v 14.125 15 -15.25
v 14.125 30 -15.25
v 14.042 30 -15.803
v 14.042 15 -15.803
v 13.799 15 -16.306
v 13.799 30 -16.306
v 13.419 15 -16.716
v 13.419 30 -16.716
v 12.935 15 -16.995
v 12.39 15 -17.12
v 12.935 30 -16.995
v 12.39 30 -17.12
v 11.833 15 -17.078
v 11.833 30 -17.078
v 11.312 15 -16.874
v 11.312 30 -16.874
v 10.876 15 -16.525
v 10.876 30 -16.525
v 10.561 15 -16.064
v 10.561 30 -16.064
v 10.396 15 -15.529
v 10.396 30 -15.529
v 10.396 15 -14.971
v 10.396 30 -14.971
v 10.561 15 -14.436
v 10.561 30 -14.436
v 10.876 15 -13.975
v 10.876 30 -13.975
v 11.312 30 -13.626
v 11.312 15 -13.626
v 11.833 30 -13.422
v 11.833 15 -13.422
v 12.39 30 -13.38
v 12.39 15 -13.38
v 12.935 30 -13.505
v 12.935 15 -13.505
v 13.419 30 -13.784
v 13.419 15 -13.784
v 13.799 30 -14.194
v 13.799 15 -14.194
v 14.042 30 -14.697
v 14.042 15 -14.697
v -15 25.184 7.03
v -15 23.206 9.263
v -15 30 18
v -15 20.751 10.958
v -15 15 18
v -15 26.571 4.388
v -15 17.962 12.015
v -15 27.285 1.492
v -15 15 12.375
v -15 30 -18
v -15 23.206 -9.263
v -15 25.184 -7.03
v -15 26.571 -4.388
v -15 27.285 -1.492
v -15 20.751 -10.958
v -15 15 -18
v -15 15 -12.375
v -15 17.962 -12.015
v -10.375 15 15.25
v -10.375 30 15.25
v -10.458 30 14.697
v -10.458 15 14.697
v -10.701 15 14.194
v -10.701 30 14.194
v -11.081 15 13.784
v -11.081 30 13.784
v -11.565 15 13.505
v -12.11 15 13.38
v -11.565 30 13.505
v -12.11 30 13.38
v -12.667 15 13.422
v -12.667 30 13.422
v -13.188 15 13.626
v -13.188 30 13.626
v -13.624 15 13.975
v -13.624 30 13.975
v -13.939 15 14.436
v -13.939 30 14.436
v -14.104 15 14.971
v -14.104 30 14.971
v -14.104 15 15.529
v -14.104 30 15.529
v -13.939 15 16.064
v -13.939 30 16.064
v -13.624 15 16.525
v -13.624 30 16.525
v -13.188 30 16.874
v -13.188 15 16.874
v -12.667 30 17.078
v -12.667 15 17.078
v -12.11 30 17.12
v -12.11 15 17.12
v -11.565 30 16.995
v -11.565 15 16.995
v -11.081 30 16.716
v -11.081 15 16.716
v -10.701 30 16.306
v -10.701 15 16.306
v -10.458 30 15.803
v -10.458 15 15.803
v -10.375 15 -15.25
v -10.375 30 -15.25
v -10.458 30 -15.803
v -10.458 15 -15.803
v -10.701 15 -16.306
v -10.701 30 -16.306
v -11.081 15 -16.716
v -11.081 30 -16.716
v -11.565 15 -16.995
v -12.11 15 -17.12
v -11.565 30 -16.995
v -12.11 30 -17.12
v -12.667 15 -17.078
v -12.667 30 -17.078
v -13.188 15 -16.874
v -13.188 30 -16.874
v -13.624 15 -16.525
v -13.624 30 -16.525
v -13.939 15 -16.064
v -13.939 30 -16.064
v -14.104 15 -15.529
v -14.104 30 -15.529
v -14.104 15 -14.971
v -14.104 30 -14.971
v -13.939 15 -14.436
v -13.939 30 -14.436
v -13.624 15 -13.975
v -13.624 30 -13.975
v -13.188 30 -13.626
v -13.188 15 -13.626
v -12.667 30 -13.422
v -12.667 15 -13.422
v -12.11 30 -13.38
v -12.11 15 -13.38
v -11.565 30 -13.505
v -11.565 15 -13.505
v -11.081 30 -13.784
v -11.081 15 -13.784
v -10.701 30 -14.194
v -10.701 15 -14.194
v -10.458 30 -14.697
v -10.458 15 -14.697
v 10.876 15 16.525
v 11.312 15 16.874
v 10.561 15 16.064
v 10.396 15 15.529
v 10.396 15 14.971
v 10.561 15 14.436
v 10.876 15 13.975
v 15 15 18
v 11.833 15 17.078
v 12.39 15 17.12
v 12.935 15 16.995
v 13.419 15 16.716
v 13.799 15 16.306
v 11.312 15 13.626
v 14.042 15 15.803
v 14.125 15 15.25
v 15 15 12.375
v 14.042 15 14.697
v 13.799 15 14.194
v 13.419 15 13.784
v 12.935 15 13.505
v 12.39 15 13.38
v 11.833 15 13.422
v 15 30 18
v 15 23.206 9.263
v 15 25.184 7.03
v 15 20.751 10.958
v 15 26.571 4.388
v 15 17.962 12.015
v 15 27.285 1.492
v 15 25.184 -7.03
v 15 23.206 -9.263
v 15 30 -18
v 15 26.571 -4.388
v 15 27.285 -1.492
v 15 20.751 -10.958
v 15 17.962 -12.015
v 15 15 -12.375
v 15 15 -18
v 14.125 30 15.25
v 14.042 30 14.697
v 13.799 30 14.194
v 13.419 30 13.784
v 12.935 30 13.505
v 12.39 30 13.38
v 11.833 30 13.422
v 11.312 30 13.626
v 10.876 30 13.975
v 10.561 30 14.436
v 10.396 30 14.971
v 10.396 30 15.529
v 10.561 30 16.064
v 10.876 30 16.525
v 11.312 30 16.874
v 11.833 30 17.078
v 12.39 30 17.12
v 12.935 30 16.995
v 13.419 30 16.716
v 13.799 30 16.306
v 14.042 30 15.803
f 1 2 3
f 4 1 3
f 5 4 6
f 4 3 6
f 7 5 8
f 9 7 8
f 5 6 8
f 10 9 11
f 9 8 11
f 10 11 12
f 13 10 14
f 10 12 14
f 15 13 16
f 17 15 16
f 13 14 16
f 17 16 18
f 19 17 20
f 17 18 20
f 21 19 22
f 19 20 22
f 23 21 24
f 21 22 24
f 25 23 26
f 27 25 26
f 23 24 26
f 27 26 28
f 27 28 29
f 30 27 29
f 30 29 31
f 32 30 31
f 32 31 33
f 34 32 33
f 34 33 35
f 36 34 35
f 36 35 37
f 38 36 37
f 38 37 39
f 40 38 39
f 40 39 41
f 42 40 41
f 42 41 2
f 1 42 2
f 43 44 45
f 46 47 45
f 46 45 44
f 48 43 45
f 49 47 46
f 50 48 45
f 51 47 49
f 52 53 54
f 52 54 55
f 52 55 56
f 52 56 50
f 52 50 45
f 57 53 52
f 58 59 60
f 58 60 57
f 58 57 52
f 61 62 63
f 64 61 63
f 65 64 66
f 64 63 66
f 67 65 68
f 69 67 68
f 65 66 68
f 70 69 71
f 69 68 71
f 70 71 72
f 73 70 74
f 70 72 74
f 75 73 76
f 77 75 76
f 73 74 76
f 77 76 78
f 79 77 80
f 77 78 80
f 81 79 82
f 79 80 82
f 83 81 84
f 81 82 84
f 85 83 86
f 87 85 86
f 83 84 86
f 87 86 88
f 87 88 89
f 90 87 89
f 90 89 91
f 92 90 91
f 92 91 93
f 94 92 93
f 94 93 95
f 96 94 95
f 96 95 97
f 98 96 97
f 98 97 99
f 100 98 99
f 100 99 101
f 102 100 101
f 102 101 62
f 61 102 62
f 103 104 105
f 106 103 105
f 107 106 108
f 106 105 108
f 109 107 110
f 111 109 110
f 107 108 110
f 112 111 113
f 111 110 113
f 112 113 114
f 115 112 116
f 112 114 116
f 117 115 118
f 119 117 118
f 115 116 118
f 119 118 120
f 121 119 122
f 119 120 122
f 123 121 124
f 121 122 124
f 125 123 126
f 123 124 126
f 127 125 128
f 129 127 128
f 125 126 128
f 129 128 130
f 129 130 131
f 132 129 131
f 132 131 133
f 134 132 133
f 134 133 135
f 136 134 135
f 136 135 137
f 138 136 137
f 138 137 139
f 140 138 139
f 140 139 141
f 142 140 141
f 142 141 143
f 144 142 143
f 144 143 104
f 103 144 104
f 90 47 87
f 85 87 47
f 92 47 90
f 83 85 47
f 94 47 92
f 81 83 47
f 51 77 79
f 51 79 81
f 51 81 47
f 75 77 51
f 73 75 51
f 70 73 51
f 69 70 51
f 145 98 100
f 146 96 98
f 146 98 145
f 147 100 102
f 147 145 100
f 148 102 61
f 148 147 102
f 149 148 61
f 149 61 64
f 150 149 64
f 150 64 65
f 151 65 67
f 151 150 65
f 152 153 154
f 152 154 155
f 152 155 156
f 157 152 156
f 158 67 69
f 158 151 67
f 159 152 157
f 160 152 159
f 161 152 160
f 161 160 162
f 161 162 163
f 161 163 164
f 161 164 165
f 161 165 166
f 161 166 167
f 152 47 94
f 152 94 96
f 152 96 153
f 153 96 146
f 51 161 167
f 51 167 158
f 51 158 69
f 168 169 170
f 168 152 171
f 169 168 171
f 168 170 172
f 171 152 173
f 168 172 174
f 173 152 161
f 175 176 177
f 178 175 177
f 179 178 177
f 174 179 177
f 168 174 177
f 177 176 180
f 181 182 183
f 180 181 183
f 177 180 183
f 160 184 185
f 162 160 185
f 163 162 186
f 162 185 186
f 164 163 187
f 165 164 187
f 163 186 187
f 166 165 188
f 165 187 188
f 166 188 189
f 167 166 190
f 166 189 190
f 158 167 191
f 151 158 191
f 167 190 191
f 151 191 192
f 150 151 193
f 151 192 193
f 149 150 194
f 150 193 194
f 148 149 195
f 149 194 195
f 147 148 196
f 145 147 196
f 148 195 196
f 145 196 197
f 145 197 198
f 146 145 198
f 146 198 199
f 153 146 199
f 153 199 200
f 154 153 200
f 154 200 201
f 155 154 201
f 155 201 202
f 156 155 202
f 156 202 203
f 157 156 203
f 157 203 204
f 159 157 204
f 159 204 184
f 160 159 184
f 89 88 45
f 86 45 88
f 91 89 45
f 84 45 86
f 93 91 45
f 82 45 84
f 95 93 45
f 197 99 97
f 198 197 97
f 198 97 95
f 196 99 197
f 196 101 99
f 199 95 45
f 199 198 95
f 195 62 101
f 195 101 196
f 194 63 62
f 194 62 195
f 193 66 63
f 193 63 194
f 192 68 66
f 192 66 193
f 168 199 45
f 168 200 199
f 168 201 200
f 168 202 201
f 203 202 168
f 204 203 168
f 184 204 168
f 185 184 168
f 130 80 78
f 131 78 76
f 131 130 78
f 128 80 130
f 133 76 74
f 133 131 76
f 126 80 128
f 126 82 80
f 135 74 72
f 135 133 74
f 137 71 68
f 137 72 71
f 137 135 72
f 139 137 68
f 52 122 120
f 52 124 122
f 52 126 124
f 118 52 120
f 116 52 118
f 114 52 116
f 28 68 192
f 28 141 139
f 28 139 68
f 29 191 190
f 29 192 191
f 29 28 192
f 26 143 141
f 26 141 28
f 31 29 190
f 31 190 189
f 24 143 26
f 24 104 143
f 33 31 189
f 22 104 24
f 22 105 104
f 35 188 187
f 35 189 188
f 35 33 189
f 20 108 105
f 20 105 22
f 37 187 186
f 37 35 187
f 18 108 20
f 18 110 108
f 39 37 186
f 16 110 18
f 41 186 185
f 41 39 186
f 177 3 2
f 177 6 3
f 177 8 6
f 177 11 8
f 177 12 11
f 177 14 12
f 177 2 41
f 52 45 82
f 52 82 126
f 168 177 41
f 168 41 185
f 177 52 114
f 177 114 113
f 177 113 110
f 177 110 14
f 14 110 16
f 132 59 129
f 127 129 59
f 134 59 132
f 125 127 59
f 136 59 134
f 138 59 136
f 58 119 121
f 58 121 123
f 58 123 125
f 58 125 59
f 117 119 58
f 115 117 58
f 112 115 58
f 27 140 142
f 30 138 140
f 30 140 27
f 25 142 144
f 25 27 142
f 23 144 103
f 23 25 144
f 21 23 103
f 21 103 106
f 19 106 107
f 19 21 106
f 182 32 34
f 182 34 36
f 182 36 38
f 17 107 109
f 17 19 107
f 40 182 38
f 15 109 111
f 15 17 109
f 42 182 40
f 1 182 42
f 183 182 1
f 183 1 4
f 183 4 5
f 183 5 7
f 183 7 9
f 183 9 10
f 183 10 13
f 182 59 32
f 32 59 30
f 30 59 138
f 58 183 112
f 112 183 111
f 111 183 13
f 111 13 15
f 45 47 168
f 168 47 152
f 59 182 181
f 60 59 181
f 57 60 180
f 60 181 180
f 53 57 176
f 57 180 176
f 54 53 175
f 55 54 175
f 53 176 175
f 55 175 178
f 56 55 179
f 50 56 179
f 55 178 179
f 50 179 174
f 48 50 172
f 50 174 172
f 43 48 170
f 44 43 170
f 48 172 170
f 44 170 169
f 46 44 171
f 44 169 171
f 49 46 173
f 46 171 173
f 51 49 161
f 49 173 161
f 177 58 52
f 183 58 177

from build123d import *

# Parameters (mm, degrees)
SKETCH1_W           = 30
SKETCH1_H           = 36
BOSS_EXTRUDE1_DEPTH = 30
SKETCH3_R           = 12.375
CUT_EXTRUDE1_DEPTH  = 40
SKETCH5_R           = 1.875
CUT_EXTRUDE2_DEPTH  = 40
CUT_EXTRUDE3_START  = 15
SKETCH7_W           = 36
SKETCH7_H           = 15
CUT_EXTRUDE3_DEPTH  = 31


with BuildPart() as part:
    # Sketch1 → Boss-Extrude1 (new body)
    with BuildSketch(Plane(origin=(0, 0, 0), x_dir=(1, 0, 0), z_dir=(0, 1, 0))):
        Rectangle(SKETCH1_W, SKETCH1_H)
    extrude(amount=BOSS_EXTRUDE1_DEPTH)

    # Sketch3 → Cut-Extrude1 (cut)
    with BuildSketch(Plane(origin=(15, 0, 0), x_dir=(0, 0, -1), z_dir=(1, 0, 0))):
        with Locations((0, 15)):
            Circle(SKETCH3_R)
    extrude(amount=-CUT_EXTRUDE1_DEPTH, mode=Mode.SUBTRACT)

    # Sketch5 → Cut-Extrude2 (cut)
    with BuildSketch(Plane(origin=(0, 30, 0), x_dir=(1, 0, 0), z_dir=(0, 1, 0))):
        with Locations((-12.25, 15.25)):
            Circle(SKETCH5_R)
        with Locations((-12.25, -15.25)):
            Circle(SKETCH5_R)
        with Locations((12.25, -15.25)):
            Circle(SKETCH5_R)
        with Locations((12.25, 15.25)):
            Circle(SKETCH5_R)
    extrude(amount=-CUT_EXTRUDE2_DEPTH, mode=Mode.SUBTRACT)

    # Sketch7 → Cut-Extrude3 (cut, through all)
    with BuildSketch(Plane(origin=(0, 0, 0), x_dir=(0, 0, -1), z_dir=(1, 0, 0)).offset(CUT_EXTRUDE3_START)):
        with Locations((0, 7.5)):
            Rectangle(SKETCH7_W, SKETCH7_H)
    extrude(amount=-CUT_EXTRUDE3_DEPTH, mode=Mode.SUBTRACT)


solid = part.part
